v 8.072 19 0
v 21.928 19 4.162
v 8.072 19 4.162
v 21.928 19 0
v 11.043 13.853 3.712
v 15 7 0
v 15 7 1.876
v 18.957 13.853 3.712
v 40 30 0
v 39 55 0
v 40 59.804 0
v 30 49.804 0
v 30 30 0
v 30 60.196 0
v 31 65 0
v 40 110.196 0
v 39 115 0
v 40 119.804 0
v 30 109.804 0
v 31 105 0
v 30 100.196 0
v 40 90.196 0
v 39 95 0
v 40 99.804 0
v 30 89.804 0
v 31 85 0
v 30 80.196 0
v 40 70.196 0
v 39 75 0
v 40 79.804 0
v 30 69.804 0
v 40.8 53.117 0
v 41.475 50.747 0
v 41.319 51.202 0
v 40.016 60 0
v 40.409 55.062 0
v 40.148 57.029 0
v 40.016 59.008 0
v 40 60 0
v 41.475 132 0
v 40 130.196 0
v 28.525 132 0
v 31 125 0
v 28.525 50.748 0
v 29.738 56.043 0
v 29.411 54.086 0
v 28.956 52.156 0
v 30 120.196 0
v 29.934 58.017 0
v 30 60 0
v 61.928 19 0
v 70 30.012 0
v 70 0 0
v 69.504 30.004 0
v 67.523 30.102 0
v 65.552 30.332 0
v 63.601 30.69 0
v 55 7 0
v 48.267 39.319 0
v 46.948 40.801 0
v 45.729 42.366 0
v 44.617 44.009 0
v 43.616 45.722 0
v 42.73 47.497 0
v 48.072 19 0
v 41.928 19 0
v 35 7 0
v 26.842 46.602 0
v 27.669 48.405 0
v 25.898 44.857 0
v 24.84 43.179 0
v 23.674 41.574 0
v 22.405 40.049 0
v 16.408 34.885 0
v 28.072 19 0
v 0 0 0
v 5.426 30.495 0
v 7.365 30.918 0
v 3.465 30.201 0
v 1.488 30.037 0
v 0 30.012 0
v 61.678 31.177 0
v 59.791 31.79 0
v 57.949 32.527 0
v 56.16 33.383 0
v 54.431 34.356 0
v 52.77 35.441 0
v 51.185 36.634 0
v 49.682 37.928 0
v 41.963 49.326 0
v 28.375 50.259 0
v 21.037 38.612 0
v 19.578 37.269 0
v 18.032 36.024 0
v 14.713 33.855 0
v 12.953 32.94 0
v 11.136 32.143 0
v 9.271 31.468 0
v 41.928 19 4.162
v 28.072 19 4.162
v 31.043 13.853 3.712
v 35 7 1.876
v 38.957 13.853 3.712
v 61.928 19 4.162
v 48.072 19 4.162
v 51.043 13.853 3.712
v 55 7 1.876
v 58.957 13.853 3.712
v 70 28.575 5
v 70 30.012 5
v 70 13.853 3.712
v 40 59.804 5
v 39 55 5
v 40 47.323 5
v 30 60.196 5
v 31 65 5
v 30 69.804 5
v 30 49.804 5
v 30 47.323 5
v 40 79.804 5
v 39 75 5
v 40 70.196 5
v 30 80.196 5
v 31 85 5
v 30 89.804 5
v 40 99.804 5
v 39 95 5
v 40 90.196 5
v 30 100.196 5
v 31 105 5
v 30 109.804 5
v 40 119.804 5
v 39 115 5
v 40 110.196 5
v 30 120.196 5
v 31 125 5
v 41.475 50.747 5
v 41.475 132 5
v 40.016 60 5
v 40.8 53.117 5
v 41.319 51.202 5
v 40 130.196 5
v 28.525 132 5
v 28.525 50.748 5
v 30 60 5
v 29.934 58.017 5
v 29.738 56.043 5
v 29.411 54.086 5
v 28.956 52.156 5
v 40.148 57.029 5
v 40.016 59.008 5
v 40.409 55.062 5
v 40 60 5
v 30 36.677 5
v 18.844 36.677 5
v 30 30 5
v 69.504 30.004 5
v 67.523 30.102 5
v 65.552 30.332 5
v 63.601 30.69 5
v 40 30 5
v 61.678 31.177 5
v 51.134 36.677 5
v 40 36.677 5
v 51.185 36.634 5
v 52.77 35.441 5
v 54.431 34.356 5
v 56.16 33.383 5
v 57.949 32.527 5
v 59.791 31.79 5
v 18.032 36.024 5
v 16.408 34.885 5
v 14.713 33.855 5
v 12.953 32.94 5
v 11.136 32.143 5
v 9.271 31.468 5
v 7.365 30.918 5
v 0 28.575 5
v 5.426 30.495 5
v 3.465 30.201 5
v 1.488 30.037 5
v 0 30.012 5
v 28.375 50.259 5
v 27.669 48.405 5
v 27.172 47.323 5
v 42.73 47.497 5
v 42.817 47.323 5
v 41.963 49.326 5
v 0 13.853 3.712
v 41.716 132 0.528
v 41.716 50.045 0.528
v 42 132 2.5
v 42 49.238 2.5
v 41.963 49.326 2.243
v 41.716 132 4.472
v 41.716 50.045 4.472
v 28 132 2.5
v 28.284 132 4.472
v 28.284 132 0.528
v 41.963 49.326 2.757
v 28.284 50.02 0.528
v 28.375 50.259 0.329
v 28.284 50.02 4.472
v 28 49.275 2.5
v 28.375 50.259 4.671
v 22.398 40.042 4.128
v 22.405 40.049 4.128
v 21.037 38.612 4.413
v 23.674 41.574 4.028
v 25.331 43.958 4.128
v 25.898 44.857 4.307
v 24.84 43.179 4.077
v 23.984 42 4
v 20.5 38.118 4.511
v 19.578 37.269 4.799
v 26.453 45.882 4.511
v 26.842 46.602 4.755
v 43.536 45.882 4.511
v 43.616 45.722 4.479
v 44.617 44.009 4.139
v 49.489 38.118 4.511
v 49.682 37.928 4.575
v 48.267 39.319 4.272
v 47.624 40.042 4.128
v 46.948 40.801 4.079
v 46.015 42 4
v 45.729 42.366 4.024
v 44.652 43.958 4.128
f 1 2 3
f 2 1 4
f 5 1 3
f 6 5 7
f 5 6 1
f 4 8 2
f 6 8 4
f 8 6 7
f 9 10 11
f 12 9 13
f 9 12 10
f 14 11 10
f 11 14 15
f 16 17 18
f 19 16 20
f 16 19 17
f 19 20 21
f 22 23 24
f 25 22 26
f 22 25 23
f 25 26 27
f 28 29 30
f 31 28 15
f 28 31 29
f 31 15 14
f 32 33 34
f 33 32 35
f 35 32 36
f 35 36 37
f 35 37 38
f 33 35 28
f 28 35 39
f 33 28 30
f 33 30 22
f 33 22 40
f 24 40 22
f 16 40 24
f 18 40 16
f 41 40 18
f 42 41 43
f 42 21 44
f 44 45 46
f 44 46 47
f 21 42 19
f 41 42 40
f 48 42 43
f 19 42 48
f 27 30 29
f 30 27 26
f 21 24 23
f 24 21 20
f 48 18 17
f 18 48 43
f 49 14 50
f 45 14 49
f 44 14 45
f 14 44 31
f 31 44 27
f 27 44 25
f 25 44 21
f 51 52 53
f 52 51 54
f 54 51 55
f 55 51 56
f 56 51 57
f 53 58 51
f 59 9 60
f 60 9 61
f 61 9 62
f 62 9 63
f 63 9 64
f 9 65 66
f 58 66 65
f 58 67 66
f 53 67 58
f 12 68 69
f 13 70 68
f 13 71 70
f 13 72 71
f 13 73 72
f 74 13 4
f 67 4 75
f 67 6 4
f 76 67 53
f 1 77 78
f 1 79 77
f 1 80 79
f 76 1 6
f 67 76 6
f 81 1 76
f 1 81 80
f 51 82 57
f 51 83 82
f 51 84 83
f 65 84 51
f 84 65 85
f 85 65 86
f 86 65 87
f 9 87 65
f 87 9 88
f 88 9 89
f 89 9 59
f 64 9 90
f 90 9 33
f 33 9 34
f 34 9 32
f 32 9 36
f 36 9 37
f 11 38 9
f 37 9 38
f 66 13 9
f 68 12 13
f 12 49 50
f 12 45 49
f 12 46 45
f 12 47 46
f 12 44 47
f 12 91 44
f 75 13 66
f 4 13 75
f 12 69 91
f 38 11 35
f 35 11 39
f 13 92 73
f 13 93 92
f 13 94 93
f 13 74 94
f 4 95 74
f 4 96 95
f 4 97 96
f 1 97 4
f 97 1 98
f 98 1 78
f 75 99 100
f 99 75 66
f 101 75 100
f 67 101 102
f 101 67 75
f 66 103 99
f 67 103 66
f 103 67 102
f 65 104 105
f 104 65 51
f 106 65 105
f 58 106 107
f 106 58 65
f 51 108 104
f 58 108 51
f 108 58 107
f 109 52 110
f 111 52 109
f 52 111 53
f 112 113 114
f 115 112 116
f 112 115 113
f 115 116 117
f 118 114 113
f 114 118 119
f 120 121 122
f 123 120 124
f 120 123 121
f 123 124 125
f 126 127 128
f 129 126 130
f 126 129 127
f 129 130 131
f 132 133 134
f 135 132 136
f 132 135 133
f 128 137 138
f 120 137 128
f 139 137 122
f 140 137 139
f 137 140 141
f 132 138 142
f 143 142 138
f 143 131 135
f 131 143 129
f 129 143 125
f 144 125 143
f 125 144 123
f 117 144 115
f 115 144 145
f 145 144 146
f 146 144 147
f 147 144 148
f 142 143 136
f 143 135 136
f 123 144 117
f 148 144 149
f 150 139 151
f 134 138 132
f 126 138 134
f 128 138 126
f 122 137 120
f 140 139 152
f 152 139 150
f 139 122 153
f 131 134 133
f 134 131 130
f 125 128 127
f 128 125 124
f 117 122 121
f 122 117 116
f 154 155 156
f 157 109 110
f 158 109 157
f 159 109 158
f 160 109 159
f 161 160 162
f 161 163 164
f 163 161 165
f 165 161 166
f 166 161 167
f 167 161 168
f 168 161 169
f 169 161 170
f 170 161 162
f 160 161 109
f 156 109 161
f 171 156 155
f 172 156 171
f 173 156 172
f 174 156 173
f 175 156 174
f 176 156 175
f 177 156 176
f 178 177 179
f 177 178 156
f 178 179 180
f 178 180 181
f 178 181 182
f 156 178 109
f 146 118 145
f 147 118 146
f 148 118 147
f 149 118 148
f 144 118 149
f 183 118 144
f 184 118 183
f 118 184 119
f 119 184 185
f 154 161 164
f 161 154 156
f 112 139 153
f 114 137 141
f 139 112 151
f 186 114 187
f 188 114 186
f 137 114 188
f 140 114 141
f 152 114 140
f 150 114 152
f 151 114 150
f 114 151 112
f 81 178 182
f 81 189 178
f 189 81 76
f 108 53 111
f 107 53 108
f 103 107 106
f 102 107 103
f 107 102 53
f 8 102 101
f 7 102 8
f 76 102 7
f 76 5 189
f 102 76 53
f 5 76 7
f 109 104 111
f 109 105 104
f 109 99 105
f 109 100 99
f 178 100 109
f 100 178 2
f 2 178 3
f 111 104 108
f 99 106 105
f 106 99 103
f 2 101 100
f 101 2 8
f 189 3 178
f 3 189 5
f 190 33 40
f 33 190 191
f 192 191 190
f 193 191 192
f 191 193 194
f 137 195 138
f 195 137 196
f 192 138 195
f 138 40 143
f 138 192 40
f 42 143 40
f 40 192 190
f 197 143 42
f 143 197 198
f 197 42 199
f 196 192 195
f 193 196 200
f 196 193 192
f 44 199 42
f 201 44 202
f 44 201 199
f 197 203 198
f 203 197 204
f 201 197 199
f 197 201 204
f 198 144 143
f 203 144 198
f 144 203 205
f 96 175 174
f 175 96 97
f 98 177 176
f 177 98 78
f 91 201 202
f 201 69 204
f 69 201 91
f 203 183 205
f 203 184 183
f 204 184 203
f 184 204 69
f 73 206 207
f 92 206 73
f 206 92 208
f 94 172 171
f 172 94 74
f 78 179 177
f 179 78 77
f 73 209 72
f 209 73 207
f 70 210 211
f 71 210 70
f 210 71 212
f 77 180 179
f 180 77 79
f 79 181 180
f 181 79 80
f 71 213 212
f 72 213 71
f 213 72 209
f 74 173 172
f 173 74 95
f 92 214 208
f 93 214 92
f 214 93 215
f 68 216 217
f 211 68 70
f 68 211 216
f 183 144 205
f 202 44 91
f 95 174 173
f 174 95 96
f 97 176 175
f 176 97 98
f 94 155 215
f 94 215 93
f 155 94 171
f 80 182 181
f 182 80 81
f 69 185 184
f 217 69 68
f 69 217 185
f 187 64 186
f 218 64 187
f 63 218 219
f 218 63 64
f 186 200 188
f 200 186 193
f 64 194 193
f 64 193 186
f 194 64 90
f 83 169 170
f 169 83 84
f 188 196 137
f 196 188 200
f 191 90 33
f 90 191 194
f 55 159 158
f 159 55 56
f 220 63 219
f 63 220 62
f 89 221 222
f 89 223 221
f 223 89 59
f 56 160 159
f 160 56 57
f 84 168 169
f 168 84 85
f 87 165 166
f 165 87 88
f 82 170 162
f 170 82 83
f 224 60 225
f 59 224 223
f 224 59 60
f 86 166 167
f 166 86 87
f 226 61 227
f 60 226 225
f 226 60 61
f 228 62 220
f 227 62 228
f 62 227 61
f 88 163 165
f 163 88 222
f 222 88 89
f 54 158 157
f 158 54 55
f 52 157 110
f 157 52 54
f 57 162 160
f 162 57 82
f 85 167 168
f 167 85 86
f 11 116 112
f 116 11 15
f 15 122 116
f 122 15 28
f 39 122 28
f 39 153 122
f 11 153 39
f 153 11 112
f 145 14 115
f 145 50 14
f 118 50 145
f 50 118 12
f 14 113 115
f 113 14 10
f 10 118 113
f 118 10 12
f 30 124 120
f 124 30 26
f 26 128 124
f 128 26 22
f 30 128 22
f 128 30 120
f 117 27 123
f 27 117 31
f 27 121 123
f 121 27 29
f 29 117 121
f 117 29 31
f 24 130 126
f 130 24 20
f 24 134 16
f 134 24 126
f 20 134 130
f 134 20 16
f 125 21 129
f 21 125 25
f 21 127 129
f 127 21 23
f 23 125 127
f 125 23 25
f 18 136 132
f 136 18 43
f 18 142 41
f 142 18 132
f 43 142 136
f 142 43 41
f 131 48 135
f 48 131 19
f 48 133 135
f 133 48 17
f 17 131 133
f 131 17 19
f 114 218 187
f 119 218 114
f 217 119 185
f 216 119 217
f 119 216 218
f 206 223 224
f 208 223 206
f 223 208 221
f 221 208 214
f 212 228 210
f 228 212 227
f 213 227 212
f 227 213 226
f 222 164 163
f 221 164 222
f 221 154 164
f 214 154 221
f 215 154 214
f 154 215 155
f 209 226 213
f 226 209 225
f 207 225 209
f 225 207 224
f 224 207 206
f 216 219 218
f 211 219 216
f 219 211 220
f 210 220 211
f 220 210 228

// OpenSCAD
$fa=1;

module scraper() {
    difference() {
        cube([70, 30, 5]);

        translate([0, 0, 0])
            rotate([15, 0, 0])
                cube([70, 30, 5]);
        
        translate([0, 0, 2.5])
            rotate([5, 0, 0])
                cube([70, 30, 5]);
        
        for(i=[15:20:60]) {
            translate([i, 15, 0])
                rotate([0, 0, 30])
                    cylinder(5, 8, 8, $fn=3);
        }
    }
}

module handle() {
    translate([35, 30, 2.5])
        difference() {
            rotate([-90, 0, 0])
                cylinder(102, 7, 7);
            
            translate([-7.5, 0, 2.5])
                cube([15, 102, 10]);
            
            translate([-7.5, 0, -12.5])
                cube([15, 102, 10]);
        }
}


module affordances() {
    translate([0, 30, 0]) {     
        difference() {
            cube([30, 30, 5]);
            translate([0, 30, 0])
                cylinder(5, 30, 30);
        }

        translate([40, 0, 0])
            difference() {
            cube([30, 30, 5]);
            translate([30, 30, 0])
                cylinder(5, 30, 30);
        }
    }
}

module main_body() {
    scraper();
    handle();
    affordances();
}

difference() {
    main_body();
    
    // thumb place
    translate([15, 42, 19])
        rotate([0, 90, 0])
            cylinder(40, 15, 15);
    
    // speed holes
    translate([35, 50, -5])
        for(i=[15:20:75]) {
            translate([2, i, 0])
                rotate([0, 0, 180])
                    cylinder(50, 6, 6, $fn=3);
            translate([-2, i-10, 0])
                cylinder(50, 6, 6, $fn=3);
        }
}
